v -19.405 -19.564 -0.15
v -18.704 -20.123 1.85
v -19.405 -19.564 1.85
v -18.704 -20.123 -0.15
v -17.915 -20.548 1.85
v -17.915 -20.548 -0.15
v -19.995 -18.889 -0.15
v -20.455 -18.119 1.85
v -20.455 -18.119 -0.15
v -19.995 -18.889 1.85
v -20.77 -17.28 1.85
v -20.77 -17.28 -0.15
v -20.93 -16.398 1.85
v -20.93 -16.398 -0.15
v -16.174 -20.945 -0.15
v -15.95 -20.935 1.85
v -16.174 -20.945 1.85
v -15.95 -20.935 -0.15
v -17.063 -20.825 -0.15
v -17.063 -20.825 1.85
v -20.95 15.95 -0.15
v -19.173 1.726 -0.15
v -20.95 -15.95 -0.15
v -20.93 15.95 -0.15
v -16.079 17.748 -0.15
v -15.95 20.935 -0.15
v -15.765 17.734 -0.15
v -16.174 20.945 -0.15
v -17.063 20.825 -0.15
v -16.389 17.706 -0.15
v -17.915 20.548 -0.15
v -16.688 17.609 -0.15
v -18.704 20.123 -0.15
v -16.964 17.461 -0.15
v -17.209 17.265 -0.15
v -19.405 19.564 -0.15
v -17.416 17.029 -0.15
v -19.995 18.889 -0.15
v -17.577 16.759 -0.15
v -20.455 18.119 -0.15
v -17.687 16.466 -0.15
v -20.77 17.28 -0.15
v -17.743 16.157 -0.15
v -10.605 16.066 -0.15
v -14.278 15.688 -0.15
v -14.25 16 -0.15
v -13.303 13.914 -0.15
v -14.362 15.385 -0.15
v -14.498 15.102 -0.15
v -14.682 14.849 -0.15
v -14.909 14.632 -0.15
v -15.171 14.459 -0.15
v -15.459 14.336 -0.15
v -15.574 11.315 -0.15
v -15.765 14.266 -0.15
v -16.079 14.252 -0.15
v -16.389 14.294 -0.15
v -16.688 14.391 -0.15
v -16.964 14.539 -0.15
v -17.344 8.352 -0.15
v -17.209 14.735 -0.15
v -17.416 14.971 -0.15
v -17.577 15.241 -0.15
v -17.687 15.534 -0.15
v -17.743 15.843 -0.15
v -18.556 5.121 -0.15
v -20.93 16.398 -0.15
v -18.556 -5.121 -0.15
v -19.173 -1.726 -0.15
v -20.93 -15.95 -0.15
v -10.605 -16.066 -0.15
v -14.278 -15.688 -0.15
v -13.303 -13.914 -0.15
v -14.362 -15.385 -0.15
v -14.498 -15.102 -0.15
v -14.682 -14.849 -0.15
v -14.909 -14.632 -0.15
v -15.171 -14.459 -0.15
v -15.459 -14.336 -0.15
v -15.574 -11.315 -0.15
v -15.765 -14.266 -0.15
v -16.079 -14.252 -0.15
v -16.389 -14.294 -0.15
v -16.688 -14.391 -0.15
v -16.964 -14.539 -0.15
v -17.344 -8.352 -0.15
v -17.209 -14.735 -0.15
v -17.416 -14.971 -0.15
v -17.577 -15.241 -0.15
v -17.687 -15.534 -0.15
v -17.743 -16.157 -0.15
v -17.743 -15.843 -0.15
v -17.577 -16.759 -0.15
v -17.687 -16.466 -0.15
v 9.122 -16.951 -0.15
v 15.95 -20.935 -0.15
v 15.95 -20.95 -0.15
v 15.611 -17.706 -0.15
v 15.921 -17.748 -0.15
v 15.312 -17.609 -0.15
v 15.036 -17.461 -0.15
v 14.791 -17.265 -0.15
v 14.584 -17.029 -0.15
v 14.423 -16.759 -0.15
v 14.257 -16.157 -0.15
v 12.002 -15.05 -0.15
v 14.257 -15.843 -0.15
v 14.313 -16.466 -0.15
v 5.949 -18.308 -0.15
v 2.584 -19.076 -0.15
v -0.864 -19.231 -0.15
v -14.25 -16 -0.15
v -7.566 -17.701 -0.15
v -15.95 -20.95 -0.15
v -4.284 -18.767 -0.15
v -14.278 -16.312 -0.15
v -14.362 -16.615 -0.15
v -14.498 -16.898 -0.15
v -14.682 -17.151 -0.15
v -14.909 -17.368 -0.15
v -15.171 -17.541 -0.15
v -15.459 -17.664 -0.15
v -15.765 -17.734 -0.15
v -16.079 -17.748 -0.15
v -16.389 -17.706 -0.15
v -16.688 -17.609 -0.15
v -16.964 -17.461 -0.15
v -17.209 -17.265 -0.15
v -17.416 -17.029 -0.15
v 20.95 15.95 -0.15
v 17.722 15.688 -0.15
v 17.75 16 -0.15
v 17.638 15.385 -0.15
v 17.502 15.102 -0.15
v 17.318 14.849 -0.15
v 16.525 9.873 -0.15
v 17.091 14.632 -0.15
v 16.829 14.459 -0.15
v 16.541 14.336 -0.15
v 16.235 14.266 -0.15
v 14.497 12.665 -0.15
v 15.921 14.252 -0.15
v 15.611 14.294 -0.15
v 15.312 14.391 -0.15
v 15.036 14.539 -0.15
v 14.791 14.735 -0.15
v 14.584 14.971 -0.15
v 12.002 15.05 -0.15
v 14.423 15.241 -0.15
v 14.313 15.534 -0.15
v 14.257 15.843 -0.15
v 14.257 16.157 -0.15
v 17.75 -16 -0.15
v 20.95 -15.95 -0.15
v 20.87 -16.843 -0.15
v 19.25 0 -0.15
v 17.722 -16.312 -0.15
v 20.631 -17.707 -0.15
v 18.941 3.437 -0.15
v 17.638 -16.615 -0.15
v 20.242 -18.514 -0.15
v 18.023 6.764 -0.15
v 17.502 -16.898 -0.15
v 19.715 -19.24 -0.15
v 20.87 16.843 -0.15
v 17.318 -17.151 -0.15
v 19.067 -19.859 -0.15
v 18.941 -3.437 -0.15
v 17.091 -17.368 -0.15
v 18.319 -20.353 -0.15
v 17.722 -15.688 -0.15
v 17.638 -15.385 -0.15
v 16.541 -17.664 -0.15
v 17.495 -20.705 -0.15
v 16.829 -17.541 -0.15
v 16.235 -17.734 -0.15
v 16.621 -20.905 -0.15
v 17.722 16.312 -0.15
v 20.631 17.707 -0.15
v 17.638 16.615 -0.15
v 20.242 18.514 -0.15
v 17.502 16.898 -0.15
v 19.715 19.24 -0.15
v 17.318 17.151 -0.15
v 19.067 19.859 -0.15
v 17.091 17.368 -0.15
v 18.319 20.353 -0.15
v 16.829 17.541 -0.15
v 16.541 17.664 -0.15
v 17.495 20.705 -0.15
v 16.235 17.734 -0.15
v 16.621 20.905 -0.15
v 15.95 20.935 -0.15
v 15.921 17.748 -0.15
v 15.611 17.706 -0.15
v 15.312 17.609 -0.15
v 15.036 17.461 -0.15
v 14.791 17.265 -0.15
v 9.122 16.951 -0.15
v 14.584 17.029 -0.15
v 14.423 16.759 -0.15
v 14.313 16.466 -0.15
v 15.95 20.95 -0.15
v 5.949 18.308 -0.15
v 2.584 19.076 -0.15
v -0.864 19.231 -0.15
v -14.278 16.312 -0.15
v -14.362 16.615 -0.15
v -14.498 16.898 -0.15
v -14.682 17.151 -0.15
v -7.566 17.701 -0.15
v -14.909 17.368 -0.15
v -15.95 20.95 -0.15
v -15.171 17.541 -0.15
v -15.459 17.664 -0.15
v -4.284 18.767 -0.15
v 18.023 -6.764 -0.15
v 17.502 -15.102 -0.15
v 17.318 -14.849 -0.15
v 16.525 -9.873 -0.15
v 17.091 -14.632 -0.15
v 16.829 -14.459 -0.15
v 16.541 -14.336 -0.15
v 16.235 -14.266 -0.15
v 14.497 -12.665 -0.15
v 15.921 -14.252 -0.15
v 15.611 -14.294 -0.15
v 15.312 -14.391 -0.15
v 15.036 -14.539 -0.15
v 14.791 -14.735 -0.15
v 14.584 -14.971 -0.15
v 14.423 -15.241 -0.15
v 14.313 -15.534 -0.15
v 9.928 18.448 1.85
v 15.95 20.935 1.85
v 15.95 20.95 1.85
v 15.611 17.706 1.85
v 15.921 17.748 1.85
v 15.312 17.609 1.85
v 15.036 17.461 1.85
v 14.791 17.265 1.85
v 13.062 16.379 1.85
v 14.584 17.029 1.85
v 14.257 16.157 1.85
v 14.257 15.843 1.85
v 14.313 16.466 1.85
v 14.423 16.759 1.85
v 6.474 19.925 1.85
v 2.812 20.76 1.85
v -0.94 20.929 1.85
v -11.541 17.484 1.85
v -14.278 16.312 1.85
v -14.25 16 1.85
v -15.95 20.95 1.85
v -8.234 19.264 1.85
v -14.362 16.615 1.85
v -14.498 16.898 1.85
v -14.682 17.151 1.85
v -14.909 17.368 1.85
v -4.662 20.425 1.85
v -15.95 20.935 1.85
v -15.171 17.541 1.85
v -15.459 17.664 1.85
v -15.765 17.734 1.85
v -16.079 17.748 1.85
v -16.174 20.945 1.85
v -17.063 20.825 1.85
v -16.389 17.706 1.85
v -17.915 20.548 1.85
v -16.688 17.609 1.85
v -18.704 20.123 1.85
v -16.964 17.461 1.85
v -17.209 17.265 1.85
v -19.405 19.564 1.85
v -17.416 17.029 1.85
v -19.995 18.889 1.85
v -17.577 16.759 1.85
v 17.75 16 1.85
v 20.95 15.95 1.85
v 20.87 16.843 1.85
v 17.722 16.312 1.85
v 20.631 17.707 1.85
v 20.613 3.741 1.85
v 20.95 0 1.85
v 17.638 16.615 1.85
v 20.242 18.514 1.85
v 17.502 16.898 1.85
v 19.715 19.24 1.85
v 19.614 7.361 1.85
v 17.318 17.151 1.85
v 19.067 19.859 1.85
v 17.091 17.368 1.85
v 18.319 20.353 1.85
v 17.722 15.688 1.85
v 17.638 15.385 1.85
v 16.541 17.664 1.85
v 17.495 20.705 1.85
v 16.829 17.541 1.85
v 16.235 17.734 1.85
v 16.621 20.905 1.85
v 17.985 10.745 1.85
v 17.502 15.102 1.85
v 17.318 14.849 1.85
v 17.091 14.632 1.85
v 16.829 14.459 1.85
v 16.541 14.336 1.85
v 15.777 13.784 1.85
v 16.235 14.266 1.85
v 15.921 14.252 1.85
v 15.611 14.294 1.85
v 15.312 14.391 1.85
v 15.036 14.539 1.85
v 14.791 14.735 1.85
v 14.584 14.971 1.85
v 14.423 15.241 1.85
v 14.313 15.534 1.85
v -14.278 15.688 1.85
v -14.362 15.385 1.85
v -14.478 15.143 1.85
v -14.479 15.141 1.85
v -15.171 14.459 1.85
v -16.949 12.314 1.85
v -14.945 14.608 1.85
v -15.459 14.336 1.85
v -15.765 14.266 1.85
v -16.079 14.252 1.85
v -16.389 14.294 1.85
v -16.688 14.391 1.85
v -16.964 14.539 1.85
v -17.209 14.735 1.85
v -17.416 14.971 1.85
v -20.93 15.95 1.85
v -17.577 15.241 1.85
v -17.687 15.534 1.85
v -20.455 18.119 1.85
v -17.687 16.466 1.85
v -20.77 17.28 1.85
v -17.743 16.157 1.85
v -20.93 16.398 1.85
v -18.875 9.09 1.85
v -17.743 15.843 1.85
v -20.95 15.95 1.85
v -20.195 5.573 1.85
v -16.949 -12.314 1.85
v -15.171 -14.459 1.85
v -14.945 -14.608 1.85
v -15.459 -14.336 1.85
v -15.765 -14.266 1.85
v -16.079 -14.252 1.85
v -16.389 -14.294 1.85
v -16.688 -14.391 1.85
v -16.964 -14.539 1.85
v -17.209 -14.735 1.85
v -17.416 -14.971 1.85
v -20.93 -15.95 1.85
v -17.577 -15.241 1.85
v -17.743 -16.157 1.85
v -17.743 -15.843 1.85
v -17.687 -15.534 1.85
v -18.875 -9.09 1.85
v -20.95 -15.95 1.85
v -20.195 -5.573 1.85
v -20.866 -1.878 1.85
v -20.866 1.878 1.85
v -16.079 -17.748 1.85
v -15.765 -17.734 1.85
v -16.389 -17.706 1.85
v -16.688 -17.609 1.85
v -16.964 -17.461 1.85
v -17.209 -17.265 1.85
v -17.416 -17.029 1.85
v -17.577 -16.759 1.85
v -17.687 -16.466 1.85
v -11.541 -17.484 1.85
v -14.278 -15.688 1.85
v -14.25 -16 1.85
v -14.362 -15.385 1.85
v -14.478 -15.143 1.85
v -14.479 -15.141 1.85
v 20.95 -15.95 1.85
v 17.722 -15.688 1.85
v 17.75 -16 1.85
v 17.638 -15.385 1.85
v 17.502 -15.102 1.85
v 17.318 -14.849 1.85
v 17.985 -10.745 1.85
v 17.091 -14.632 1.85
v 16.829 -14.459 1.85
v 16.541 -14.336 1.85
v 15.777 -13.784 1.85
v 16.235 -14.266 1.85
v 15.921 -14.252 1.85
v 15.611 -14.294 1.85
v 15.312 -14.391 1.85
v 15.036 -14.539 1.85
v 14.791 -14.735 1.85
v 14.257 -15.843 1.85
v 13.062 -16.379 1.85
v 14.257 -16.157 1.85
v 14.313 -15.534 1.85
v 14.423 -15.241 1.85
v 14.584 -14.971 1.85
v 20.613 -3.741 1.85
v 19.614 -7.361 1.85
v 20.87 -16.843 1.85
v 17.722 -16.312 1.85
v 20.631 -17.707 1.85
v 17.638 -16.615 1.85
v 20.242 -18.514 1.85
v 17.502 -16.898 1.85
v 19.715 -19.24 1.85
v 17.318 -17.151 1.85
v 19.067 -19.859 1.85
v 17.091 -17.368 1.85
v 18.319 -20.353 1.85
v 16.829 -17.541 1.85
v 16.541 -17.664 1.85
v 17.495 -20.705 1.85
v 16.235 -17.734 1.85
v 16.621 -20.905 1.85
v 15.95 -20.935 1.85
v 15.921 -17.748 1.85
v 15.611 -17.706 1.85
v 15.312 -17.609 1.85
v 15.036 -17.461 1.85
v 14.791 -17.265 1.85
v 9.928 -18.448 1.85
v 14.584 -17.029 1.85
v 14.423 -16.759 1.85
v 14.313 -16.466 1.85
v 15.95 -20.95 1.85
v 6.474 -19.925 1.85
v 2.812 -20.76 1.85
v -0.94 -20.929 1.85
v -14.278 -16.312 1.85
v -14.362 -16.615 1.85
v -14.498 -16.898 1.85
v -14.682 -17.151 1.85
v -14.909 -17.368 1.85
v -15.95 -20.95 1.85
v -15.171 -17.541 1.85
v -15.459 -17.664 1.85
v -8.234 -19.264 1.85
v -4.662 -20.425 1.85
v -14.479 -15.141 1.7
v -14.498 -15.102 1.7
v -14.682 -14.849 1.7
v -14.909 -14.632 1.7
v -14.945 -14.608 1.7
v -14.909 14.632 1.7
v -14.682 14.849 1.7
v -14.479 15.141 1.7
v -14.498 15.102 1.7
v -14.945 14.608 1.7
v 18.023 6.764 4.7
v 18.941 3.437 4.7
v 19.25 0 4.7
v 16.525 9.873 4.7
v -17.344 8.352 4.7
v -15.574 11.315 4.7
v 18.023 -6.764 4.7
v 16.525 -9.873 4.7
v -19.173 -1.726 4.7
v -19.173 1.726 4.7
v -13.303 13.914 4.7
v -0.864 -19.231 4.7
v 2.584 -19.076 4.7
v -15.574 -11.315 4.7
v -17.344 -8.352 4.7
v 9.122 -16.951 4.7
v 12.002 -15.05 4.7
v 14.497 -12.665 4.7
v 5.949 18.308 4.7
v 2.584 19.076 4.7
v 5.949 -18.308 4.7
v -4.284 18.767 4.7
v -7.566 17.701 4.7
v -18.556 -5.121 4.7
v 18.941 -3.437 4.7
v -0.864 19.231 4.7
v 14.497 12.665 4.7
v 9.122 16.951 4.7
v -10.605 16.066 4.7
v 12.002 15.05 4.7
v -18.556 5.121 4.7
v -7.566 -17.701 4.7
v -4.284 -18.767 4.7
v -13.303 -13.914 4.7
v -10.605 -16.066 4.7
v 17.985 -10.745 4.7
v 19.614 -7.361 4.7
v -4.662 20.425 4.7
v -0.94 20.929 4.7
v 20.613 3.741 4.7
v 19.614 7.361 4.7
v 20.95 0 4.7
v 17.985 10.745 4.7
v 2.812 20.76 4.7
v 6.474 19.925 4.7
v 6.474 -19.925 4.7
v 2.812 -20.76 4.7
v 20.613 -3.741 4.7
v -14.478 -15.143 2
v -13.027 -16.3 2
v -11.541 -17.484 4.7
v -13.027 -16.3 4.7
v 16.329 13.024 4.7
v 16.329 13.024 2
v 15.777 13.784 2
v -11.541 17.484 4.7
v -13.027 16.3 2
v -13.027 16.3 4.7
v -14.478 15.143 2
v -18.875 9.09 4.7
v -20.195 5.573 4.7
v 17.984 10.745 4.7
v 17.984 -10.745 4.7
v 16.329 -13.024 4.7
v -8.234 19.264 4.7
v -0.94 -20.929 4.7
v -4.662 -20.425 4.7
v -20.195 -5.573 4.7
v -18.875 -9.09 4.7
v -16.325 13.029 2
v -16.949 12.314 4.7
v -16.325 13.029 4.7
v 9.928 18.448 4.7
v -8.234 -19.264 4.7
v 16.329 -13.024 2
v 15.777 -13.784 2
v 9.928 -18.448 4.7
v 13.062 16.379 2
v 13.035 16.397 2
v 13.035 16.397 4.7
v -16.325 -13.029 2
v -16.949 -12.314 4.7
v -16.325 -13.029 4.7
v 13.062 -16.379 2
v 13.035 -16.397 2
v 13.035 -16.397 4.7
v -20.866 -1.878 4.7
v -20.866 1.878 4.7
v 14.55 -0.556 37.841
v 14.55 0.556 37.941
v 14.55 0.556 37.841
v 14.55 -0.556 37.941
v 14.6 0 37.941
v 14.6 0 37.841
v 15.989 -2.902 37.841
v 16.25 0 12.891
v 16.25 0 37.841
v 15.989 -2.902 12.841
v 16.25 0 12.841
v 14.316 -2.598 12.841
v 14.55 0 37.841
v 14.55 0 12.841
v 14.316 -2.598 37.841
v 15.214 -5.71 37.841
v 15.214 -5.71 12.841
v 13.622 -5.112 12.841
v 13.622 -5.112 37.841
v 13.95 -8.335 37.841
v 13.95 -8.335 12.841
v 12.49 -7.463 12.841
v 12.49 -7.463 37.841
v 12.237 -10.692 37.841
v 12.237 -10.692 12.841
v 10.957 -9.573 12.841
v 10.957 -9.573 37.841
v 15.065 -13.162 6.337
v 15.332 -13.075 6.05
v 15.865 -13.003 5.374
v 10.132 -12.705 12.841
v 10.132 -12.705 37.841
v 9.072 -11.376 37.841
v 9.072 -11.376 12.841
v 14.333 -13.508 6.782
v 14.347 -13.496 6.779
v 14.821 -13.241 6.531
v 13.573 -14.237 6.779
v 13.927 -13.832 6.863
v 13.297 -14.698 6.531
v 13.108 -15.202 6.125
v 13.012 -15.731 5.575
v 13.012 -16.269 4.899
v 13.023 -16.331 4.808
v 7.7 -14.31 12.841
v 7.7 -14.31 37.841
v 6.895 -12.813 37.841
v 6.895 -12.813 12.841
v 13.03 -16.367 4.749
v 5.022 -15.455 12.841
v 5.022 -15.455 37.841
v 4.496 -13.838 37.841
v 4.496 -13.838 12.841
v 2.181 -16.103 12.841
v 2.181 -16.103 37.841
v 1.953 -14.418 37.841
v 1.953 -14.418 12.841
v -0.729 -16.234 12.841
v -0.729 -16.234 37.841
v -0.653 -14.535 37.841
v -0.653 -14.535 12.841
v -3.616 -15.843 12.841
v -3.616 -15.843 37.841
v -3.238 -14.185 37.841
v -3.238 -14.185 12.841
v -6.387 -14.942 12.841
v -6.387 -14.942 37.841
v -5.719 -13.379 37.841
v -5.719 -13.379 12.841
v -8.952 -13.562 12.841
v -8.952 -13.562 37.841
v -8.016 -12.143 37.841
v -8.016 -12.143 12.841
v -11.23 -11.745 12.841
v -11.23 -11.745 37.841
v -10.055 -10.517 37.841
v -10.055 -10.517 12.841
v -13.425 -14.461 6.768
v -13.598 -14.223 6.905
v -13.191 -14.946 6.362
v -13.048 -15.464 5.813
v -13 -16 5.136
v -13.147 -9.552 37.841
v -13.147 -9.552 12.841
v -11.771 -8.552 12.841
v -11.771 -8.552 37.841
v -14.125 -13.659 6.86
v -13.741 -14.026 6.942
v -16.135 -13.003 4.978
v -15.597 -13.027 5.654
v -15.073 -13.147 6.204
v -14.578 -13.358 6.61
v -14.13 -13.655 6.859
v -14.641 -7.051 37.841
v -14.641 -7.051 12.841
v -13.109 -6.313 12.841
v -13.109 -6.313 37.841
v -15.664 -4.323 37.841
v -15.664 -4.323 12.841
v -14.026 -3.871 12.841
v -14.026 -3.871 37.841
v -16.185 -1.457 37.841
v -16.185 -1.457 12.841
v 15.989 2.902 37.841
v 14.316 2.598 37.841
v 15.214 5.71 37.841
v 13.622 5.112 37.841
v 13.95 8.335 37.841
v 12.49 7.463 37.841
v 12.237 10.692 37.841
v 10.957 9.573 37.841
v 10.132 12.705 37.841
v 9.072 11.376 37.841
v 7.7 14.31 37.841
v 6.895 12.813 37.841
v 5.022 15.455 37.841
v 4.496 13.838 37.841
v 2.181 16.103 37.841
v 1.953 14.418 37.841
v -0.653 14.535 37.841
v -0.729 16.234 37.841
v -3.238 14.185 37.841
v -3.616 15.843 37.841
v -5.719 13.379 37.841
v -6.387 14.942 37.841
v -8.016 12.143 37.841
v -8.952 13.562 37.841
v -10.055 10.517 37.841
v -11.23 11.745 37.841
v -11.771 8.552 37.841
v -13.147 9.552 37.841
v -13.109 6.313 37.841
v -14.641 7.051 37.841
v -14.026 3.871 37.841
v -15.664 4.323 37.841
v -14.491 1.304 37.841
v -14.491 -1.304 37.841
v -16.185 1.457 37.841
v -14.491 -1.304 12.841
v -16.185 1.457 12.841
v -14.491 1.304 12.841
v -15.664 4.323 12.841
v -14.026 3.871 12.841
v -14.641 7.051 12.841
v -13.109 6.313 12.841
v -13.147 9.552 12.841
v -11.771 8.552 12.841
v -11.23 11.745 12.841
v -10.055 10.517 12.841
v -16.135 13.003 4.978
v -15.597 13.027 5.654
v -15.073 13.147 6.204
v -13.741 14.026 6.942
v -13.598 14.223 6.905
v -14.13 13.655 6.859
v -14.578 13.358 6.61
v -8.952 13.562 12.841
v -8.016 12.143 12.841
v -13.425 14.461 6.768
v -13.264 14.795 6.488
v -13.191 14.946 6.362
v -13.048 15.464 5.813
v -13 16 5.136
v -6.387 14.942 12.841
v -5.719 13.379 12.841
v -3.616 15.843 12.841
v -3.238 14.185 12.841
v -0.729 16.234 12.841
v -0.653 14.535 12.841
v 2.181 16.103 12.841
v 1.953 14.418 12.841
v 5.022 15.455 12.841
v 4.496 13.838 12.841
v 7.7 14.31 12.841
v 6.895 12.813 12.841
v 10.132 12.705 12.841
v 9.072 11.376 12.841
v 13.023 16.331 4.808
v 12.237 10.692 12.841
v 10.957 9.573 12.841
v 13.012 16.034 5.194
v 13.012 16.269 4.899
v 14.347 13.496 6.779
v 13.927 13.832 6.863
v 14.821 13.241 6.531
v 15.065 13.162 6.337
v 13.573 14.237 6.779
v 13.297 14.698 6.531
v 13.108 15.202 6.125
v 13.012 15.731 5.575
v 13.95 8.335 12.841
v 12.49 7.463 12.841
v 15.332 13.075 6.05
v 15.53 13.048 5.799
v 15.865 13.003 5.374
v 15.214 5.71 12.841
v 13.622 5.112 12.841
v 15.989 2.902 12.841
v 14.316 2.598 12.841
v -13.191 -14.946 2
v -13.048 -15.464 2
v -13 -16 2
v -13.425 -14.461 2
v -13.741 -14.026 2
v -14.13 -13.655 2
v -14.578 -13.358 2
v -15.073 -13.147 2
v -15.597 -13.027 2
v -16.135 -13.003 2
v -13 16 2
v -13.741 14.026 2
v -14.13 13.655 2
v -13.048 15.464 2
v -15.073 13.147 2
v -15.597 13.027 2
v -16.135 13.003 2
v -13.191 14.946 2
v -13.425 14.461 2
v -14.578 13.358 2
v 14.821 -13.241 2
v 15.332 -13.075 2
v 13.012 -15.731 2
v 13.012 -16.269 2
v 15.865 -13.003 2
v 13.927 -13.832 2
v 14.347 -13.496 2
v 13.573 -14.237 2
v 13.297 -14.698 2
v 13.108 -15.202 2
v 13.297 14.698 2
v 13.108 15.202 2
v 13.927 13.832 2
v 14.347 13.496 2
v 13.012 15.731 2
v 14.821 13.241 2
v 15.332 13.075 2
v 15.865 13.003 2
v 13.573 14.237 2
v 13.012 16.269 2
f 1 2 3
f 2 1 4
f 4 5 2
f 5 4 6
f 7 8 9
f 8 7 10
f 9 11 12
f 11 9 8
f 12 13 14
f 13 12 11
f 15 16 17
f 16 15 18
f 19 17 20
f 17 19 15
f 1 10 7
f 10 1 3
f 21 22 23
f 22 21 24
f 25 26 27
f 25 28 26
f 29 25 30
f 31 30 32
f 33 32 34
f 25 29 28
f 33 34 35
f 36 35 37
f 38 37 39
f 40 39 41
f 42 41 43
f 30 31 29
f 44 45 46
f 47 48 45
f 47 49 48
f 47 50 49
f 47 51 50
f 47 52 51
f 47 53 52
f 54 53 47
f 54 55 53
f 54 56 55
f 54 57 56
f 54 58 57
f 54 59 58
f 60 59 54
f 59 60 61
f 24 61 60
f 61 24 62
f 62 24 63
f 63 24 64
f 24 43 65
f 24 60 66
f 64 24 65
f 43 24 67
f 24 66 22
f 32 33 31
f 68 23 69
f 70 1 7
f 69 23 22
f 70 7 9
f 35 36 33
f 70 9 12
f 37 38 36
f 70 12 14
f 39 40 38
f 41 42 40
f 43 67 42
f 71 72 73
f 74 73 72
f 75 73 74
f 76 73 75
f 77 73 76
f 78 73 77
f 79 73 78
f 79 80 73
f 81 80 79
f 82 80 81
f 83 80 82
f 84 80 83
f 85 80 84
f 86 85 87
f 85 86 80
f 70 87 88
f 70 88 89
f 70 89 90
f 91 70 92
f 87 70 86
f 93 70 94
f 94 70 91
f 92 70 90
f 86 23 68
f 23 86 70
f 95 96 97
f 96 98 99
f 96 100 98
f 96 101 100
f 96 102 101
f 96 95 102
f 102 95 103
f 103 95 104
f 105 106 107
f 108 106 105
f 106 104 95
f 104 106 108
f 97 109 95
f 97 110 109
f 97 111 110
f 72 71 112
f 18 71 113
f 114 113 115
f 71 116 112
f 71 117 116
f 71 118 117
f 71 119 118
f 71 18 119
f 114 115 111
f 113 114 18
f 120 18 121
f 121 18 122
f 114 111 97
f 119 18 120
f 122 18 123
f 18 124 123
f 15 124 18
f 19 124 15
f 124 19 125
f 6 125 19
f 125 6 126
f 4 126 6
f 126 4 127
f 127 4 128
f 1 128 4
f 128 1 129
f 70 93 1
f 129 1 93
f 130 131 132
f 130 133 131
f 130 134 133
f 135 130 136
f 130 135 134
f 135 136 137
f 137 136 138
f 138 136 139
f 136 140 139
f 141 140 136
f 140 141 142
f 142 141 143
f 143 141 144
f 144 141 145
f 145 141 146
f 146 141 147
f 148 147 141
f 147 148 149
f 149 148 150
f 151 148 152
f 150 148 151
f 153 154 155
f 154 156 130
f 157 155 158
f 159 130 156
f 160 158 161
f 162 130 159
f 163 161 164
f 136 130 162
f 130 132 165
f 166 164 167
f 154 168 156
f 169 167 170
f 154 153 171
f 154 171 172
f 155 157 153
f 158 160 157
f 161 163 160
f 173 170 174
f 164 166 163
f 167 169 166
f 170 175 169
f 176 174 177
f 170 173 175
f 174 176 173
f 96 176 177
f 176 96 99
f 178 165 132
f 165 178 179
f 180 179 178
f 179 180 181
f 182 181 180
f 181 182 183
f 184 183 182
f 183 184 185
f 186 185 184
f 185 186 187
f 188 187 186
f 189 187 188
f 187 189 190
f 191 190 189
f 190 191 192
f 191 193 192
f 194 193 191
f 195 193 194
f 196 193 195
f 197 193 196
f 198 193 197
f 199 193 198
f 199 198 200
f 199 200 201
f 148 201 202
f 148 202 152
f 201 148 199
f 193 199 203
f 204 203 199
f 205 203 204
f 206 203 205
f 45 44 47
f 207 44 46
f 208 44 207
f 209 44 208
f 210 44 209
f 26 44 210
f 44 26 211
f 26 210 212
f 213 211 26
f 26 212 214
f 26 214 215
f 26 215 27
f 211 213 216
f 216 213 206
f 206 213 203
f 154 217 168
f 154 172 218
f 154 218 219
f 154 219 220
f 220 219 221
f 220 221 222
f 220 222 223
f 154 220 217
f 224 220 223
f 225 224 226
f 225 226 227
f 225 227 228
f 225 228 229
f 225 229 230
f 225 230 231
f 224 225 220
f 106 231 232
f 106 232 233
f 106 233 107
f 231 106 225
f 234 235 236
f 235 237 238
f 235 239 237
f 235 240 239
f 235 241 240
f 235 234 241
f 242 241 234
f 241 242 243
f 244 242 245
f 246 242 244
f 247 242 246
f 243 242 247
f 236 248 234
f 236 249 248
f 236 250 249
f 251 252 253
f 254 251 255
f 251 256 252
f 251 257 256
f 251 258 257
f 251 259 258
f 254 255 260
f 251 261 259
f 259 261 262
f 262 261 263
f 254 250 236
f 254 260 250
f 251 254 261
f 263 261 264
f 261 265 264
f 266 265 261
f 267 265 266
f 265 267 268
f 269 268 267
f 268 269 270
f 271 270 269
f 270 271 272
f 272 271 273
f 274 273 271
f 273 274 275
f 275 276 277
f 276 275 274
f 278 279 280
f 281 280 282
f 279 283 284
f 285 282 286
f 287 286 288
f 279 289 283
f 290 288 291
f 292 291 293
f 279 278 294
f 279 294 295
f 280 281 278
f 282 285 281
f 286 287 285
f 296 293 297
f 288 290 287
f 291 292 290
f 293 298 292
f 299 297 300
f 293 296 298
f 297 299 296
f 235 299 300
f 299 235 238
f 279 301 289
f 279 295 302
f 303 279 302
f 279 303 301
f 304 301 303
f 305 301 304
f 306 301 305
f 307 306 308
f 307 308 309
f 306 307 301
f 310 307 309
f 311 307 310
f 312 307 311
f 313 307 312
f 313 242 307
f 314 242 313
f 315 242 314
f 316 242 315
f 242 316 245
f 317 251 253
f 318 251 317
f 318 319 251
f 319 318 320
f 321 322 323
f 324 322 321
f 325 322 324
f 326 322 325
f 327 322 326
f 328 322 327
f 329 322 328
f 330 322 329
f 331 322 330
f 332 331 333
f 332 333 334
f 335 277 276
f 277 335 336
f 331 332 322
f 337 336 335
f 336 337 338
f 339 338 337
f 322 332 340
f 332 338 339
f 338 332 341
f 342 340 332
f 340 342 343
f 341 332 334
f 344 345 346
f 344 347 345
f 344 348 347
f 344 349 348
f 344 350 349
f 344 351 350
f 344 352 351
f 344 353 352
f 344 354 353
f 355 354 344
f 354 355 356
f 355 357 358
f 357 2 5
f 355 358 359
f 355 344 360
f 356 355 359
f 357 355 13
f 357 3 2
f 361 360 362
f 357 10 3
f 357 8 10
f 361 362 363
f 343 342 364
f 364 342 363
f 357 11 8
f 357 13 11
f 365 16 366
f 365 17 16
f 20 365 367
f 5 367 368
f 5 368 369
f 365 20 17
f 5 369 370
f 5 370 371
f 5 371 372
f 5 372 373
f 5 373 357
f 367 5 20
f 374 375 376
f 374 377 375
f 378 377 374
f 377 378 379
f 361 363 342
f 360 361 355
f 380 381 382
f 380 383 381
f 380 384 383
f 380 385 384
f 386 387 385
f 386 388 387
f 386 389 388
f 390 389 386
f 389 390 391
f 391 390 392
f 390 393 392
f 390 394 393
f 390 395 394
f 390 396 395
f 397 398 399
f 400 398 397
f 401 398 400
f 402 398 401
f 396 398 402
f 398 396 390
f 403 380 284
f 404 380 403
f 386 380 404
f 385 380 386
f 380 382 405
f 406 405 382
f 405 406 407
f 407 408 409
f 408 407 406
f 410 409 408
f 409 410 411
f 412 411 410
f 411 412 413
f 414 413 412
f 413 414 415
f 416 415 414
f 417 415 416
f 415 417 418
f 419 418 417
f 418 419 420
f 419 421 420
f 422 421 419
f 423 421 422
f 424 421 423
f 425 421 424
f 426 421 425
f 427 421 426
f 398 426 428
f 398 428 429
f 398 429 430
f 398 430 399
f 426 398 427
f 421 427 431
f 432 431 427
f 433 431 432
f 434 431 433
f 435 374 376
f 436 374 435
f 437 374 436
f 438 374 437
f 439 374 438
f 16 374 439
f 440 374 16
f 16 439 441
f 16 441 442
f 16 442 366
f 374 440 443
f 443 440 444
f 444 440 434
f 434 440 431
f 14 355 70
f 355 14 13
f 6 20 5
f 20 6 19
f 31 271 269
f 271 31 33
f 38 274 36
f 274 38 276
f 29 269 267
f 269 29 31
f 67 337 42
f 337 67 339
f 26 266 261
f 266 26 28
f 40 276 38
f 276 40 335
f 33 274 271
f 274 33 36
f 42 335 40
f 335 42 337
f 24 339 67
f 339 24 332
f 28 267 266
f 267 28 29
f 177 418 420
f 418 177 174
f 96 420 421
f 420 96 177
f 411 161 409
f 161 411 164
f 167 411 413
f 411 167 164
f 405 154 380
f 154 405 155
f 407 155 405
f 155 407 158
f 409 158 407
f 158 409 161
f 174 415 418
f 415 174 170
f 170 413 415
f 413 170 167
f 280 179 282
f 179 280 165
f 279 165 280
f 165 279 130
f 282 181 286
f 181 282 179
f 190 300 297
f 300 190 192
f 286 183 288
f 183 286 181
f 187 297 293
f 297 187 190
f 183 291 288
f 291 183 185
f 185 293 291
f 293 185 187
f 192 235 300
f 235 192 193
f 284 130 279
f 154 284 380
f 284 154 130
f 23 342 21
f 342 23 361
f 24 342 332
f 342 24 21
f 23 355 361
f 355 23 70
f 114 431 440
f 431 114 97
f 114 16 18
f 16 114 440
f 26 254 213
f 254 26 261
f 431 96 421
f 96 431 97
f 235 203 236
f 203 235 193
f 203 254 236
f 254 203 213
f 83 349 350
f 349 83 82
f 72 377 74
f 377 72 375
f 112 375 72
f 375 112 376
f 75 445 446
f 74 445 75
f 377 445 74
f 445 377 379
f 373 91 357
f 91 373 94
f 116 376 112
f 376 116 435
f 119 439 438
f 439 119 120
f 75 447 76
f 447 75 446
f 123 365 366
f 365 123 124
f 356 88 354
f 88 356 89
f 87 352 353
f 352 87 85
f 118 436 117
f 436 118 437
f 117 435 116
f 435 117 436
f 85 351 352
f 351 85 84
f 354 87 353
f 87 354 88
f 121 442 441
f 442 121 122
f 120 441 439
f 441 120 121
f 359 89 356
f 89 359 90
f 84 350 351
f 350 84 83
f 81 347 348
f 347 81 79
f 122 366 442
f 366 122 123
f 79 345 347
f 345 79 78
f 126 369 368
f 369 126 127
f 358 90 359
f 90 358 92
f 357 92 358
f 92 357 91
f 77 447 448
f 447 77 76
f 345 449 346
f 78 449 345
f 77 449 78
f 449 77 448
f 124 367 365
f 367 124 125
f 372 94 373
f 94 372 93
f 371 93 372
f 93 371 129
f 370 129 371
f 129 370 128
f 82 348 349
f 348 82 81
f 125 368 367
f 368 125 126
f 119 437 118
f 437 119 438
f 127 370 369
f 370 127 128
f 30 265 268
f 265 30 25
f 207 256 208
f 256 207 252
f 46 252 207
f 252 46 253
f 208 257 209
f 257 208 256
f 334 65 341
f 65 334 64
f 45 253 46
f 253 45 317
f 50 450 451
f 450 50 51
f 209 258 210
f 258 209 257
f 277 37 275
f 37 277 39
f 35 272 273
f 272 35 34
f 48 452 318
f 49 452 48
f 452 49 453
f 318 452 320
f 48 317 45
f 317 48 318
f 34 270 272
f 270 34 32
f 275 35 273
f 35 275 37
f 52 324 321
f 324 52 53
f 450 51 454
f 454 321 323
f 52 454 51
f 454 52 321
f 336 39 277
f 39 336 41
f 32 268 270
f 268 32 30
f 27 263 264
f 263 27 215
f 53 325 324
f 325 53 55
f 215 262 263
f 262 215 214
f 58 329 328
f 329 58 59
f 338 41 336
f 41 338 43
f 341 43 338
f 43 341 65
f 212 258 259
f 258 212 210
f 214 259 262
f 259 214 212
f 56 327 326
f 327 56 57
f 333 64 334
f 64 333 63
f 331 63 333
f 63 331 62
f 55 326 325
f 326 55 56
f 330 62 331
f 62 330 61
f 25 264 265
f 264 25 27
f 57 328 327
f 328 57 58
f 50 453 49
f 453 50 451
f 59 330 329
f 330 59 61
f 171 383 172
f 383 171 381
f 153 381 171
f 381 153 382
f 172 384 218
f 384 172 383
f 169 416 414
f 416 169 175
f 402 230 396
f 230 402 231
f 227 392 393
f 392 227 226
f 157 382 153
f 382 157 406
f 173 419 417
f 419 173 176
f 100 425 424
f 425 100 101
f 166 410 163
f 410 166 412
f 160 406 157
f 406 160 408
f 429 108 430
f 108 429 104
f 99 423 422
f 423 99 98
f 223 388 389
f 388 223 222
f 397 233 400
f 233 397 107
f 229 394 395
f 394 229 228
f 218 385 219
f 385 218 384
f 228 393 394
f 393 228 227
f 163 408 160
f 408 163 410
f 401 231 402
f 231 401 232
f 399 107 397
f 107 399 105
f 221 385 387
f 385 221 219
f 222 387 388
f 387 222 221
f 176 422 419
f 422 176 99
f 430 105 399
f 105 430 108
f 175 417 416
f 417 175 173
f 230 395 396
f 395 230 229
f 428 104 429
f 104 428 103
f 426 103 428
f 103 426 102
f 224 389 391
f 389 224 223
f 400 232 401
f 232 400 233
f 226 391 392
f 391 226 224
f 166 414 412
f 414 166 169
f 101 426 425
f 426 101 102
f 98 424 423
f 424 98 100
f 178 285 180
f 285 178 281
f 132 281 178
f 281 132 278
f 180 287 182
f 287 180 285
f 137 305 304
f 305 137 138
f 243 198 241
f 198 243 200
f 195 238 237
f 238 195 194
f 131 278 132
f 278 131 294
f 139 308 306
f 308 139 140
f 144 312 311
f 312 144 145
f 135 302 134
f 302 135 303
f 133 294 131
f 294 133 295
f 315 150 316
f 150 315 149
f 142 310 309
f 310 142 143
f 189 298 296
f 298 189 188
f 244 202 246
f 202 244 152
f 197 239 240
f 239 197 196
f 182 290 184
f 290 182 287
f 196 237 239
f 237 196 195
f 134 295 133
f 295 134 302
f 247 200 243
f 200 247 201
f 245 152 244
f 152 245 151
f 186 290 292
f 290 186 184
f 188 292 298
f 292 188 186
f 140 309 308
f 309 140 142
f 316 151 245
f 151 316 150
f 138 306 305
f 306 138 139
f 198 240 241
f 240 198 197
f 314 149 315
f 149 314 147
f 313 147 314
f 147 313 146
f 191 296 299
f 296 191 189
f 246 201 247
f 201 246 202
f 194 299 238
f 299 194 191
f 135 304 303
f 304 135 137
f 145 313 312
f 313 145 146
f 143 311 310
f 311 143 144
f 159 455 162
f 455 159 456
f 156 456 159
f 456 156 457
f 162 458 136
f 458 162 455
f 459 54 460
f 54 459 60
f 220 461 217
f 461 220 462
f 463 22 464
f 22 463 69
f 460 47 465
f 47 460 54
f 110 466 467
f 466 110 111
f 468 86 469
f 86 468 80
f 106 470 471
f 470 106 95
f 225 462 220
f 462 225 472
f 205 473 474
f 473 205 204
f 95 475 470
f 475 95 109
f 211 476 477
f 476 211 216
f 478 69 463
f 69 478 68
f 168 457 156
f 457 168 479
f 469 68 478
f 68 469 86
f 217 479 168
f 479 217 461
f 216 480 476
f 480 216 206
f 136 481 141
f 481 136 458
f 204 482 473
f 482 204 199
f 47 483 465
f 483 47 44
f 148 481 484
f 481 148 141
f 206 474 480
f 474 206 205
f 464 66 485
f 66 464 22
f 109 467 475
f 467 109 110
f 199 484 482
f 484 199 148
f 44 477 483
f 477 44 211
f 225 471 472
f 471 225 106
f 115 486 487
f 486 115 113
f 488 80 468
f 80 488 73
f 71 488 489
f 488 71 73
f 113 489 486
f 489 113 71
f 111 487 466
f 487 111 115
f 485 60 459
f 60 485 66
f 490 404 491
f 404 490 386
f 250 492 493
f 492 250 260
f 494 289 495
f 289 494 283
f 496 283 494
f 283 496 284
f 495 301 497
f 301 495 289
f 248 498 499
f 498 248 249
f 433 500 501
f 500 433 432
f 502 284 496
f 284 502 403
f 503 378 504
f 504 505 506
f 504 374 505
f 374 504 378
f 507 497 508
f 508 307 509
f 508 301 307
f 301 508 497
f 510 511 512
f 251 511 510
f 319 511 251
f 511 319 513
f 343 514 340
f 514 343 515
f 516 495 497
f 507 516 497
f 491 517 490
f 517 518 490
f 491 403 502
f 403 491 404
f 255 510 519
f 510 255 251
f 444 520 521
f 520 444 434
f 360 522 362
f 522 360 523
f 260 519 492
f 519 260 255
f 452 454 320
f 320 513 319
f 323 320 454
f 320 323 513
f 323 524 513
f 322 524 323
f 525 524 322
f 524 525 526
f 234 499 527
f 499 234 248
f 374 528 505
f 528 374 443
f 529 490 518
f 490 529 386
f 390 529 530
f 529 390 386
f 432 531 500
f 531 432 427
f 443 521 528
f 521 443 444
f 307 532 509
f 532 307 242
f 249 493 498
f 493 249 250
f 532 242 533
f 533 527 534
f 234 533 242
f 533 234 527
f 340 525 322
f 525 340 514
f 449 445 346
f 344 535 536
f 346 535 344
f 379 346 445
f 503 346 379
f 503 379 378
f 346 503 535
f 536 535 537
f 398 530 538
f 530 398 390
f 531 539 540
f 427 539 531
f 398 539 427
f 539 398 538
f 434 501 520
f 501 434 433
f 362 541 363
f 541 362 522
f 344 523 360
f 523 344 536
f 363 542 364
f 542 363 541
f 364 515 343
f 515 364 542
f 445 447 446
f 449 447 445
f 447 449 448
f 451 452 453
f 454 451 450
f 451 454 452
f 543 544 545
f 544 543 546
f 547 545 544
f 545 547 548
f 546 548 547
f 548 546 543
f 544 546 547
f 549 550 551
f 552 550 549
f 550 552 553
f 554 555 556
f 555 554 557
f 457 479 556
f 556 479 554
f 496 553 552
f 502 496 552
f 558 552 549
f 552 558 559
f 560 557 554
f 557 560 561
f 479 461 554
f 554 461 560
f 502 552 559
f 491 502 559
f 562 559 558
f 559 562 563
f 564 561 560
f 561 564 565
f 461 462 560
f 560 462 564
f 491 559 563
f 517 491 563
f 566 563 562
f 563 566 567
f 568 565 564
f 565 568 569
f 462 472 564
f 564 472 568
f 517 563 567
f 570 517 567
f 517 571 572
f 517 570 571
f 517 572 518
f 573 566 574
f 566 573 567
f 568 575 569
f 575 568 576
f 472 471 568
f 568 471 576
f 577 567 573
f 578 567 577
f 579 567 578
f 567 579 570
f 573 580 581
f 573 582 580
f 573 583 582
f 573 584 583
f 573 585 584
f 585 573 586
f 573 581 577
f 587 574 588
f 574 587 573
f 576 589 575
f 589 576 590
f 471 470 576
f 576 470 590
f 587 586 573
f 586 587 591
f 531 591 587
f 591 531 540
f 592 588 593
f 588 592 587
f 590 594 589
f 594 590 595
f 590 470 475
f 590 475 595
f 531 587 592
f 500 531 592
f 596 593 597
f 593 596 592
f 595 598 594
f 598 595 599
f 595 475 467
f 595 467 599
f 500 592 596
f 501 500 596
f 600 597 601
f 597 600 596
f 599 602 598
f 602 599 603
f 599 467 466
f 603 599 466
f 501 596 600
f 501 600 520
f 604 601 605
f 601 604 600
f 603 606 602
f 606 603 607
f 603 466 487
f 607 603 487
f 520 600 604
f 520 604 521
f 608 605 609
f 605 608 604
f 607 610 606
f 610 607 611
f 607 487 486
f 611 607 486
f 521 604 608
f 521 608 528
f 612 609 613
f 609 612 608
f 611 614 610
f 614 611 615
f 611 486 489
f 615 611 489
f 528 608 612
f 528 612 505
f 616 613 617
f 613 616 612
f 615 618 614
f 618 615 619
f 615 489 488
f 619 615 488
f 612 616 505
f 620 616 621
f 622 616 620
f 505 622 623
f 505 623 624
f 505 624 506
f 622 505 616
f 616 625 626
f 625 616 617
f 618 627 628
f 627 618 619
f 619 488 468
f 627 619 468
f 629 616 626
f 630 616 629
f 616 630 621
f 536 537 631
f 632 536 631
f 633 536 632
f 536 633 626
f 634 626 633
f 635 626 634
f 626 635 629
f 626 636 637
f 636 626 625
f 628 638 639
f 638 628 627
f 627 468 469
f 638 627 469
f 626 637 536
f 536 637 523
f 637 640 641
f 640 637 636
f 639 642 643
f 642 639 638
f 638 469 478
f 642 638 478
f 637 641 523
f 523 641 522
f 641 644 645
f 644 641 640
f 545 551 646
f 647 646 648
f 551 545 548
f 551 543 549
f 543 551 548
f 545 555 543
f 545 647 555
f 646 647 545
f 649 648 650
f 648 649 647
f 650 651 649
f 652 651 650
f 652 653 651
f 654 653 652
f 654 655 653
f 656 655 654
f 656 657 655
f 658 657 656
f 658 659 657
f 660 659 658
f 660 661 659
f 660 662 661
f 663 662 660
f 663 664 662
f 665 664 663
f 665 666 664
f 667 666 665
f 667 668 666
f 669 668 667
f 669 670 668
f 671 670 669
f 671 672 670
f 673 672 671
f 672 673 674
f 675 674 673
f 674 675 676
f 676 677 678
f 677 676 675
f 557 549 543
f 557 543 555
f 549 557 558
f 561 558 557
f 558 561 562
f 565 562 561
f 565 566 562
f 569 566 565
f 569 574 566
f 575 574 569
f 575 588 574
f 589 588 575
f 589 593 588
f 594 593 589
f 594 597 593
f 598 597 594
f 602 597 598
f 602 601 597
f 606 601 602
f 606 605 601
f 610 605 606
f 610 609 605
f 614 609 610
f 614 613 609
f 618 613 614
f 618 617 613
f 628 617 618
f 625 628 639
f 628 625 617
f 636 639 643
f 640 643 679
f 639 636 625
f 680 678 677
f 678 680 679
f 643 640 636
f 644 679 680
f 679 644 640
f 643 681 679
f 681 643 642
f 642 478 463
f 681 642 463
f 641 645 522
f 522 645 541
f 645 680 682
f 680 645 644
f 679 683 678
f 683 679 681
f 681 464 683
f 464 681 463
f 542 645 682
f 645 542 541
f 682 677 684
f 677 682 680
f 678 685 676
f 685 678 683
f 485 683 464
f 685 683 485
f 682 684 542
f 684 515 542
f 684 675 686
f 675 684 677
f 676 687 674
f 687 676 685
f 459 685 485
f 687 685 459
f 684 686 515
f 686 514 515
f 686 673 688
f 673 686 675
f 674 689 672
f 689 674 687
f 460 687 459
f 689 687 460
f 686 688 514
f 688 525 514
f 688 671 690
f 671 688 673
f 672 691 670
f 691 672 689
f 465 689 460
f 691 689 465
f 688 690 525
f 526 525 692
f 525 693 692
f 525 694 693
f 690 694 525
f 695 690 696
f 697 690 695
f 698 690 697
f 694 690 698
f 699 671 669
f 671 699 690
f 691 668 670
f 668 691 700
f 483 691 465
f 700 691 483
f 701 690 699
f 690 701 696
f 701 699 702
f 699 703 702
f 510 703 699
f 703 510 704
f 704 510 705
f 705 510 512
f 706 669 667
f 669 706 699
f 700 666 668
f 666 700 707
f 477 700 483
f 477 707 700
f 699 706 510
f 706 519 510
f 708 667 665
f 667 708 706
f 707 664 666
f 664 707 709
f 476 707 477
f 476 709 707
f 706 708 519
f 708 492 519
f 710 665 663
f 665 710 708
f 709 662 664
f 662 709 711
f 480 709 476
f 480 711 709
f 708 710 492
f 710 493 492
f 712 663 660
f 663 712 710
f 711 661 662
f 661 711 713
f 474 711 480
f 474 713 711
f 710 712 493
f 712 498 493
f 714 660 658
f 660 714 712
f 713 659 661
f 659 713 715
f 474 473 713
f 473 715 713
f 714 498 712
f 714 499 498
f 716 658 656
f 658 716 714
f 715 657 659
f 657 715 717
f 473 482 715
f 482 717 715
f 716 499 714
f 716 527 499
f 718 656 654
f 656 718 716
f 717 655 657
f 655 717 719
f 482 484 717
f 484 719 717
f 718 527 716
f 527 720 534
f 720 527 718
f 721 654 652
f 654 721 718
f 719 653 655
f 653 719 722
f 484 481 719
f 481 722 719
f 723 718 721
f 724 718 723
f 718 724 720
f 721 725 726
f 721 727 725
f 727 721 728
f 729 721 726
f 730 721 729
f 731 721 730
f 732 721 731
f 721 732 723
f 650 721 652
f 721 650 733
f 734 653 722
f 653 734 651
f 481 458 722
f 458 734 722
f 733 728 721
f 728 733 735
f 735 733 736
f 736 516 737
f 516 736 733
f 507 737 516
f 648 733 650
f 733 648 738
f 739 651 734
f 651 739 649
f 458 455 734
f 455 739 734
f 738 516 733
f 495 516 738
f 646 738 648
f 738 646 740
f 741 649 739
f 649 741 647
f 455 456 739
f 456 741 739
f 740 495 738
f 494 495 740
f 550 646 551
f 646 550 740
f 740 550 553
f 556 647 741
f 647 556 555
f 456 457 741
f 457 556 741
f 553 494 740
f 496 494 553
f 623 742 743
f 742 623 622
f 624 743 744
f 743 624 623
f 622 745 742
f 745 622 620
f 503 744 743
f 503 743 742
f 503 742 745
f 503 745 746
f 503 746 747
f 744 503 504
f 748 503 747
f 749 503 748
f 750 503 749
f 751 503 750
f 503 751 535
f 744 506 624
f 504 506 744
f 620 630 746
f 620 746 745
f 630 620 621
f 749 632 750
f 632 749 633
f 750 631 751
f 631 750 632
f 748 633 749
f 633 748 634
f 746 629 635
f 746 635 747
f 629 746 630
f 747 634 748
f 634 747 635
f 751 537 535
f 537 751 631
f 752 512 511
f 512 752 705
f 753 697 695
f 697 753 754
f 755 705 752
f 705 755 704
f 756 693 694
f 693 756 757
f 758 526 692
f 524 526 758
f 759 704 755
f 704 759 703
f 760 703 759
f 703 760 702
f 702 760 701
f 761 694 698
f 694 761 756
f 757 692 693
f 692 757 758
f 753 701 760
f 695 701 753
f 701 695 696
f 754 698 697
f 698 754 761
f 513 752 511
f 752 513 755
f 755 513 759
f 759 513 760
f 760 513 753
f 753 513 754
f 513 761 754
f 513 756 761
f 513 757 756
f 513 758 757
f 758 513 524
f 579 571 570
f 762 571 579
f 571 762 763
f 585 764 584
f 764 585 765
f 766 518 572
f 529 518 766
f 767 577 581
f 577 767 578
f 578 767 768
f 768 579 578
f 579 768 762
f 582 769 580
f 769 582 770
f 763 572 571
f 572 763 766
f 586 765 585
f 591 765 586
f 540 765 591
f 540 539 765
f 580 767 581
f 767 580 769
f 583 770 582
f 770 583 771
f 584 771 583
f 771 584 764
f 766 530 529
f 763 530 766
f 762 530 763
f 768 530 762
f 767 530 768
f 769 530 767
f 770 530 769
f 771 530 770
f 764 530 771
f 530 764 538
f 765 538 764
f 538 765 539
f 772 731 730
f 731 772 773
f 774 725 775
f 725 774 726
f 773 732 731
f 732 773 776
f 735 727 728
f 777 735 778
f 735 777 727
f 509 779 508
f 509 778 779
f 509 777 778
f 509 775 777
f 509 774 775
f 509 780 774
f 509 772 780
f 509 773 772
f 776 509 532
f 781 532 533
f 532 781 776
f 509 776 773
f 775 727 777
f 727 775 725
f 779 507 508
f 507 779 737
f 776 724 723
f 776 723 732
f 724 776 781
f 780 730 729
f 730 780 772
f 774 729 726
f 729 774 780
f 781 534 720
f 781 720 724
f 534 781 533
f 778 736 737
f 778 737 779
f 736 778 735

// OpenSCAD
/*
 * Tube Adapter Flange with Grating (Parametric), v1.00
 *
 * by Alex Franke (CodeCreations), Dec 2012
 * http://www.theFrankes.com
 * 
 * Licenced under Creative Commons Attribution - Non-Commercial - Share Alike 3.0 
 * 
 * DESCRIPTION: This allows you to cover a hole with a specific diameter (with optional 
 *   grating) and then attach a hose of a different diameter. For example, if you're creating
 *   an exhaust vent for a 40mm fan to push air out through a 1.25-inch tube, then you can 
 *   render this file with a 40mm input diameter and a 1.25-inch output diameter. The angle
 *   of the transition is configurable to ensure good prints. 
 * 
 * INSTRUCTIONS:  Choose some values in the "User-defined values" section, render,
 *   and print. See the comments in that section for details on how to measure. 
 * 
 * v1.00, Mar 1, 2014: Added pinch angles, flange thickness, end rounding.
 * v0.42, Dec 20, 2012: Initial Release.
 * 
 * TODO: 
 *   * None at this time
 */

/////////////////////////////////////////////////////////////////////////////
// User-defined values... 
/////////////////////////////////////////////////////////////////////////////

roundRadius       = 5;    // The radius of the rounding on the corners
thickness         = 1.7;  // The thickness of the material (tube) 
flangeThickness   = 2.0;  // The thickness of the flange
holeDistance      = 32;   // The distance on center between the mounting holes on each side  
holeDiameter      = 3.5;  // The diameter of the mounting holes 

boltHeadDiameter  = 6;    // The diameter of the bolt head (so it doesn't interfere with the tube) 

angle             = 60;   // The angle of the transition between diameters

inputTubeLength   = 3;    // The length the input diameter will extend straight before the transition.  
inputDiameter     = 38.5; // The inner diameter (ID) of the input hole
outputLength      = 25;   // The length of the output diameter after the transition. 
outputDiameter    = 29.1; // The inner diameter (ID) of the output flange. 

meshLines         = 0;    // The number of mesh lines (grates) to render (zero for none) 
meshWidth         = 0;    // The width of the mesh material (grates) 
meshHeight        = 0;    // The thickness of the mesh material (grates)

optimizeThickness = true; // true to optimize transition thickness for FDM printing (a bit thinner), 
                          //   or false for consistent thickness 

pinchAngle1       = 90;   // The angle to pinch the output tube from one side
pinchAngle2       = 90;   // ...and from the other side 
tipCutRadius      = 0;    // The radius to round in the tip
tipCutInset       = 0;    // The distance to cut into the tip 

$fn               = 35;   // general curve quality

silliness         = 0.05; // Allows OpenSCAD to create good models 


/////////////////////////////////////////////////////////////////////////////
// Some calculated values and helpful output... 
/////////////////////////////////////////////////////////////////////////////

dx = (inputDiameter - outputDiameter)/2; 
height = dx*tan(angle);
yOffset = (thickness*tan(angle/2));
xOffset = yOffset*tan(angle);
totalHeight = inputTubeLength + outputLength + height; 

echo( str( "Outer diameter of output flange is ", outputDiameter+thickness*2, " mm or ",
	(outputDiameter+thickness*2)/25.4, " in.") ); 
echo( str( "Inner diameter of output flange is ", outputDiameter, " mm or ",
	outputDiameter/25.4, " in.") ); 
echo( str( "Total height is ", totalHeight, " mm or ",
	totalHeight/25.4, " in.") ); 


/////////////////////////////////////////////////////////////////////////////
// The code...
/////////////////////////////////////////////////////////////////////////////

difference() {
	union() {
		translate([0,0,thickness/2]) 
			base(); 
		translate([0,0,inputTubeLength/2+thickness]) 
			lowerTube(); 
		translate([0,0,thickness+inputTubeLength]) 
			cone(); 
	}

	// Carve some space for the mounting bolts. 
	translate([0,0,totalHeight/2+flangeThickness+0.5]) 
	for(x=[-1,1], y=[-1,1]) {
		translate([holeDistance/2*x,holeDistance/2*y,0]) 
			cylinder(h=totalHeight+1,r=boltHeadDiameter/2, center=true);
	}
}


/////////////////////////////////////////////////////////////////////////////
// The modules...
/////////////////////////////////////////////////////////////////////////////

// Comment out the "module" line and the "}" at the end to use these settings. 
// This is likely suitable for connecting a 40mm fan to a 1.25" tube.
module example1() {
	roundRadius       = 5;
	thickness         = 1.7;
	holeDistance      = 32;
	holeDiameter      = 3.5;
	
	boltHeadDiameter  = 6;
	
	angle             = 60;
	
	inputTubeLength   = 3;
	inputDiameter     = 38.5;
	outputLength      = 15;
	outputDiameter    = (1.28*25.4)-thickness*2;
	
	meshLines         = 0;
	meshWidth         = 0;
	meshHeight        = 0;
	
	optimizeThickness = true;
}

// Comment out the "module" line and the "}" at the end to use these settings. 
// This is likely suitable for connecting a 1.25" tube to cover a 1 1/8" - 1 1/4" hole.
module example2() {
	roundRadius       = 3;
	thickness         = 1.7;
	holeDistance      = 27;
	holeDiameter      = 3.5;
	
	boltHeadDiameter  = 6;
	
	angle             = 60;
	
	inputTubeLength   = 3;
	inputDiameter     = 30;
	outputLength      = 15;
	outputDiameter    = (1.28*25.4)-thickness*2;
	
	meshLines         = 7;
	meshWidth         = 0.8;
	meshHeight        = 1;
	
	optimizeThickness = true;
}

// Comment out the "module" line and the "}" at the end to use these settings. 
// This is likely suitable for connecting a 80mm fan to a 1 1/4" tube.
module example3() {
	roundRadius       = 3;
	thickness         = 1.7;
	holeDistance      = 71.6;
	holeDiameter      = 3.5;
	
	boltHeadDiameter  = 6;
	
	angle             = 60;
	
	inputTubeLength   = 3;
	inputDiameter     = 76;
	outputLength      = 15;
	outputDiameter    = (1.28*25.4)-thickness*2;
	
	meshLines         = 0;
	meshWidth         = 0;
	meshHeight        = 0;
	
	optimizeThickness = true;
}

// Comment out the "module" line and the "}" at the end to use these settings. 
// This makes a nice 40mm fan shroud.
module example4() {
	roundRadius       = 3;
	thickness         = 0.5;
 	flangeThickness   = 1; 
	holeDistance      = 32;
	holeDiameter      = 3.5;
	
	boltHeadDiameter  = 6;
	
	angle             = 68;
	
	inputTubeLength   = 1;
	inputDiameter     = 37;
	outputLength      = 12;
	outputDiameter    = 14;
	
	meshLines         = 0;
	meshWidth         = 0;
	meshHeight        = 0;
	
	optimizeThickness = true;

	pinchAngle1       = 60; 
	pinchAngle2       = 70;
	tipCutRadius      = 12; 
	tipCutInset       = 1.5; 
}


module cone() {
	
	y = optimizeThickness ? 0 : yOffset; 

	difference() { 

		union() {
			rotate([0,0,180]) // line up the edges 
			rotate_extrude(convexity=5)
			polygon(points=[
				[inputDiameter/2+thickness,0],
				[outputDiameter/2+thickness,height],
				[outputDiameter/2+thickness,height+outputLength],
				[outputDiameter/2,height+outputLength],
				[outputDiameter/2,height-y],
				[inputDiameter/2,0-y]
			]);
		
			translate([0,0,silliness]) 
			intersection() {
				union() {
					translate([outputDiameter/2,-(outputDiameter+1)/2,height]) 
						rotate([0,-90+pinchAngle1,0]) 
							cube([thickness,outputDiameter+1,outputLength*2]); 
					translate([-outputDiameter/2-thickness,-(outputDiameter+1)/2,height]) 
						rotate([0,90-pinchAngle2,0]) 
							cube([thickness,outputDiameter+1,outputLength*2]); 
				}
				translate([0,0,height+silliness]) 
					cylinder(h=outputLength, r=outputDiameter/2+silliness); 
			}
		}

		// clean up the pinches 
		translate([outputDiameter/2+thickness,-(outputDiameter+thickness*2+1)/2,height+silliness]) 
			rotate([0,-90+pinchAngle1,0]) 
				cube([outputDiameter,outputDiameter+thickness*2+1,outputLength*2]); 
		translate([-outputDiameter/2-thickness,-(outputDiameter+thickness*2+1)/2,height+silliness]) 
			rotate([0,90-pinchAngle2,0]) 
				translate([-outputDiameter,0,0]) 
				cube([outputDiameter,outputDiameter+thickness*2+1,outputLength*2]);

		// Cut a radius into the tip
		translate([0,0,height+outputLength+tipCutRadius-tipCutInset]) 
			rotate([0,90,0])  	
				cylinder(r=tipCutRadius, h=outputDiameter+thickness*2+1, center=true); 	

	}
}

module lowerTube() {
	difference() {
		cylinder(h=inputTubeLength, r=inputDiameter/2+thickness, center=true);
		cylinder(h=inputTubeLength+1, r=inputDiameter/2, center=true);
	}
}

module base() {
	wid = max( inputDiameter + thickness*2, holeDistance + boltHeadDiameter); 
	dist = wid/2-roundRadius; 
	// meshLines = ( inputDiameter + thickness*2 - meshSize ) / ( meshWidth + meshSize );
	meshDistance = ( wid-meshWidth*meshLines ) / (meshLines+1); 


	echo( str( "Mesh hole size ", meshWidth + meshDistance, " mm" ) ); 

	union() {

		difference() {
			union() {
				for(x=[-1,1], y=[-1,1]) {
					translate([dist*x,dist*y,0]) 
						cylinder(h=flangeThickness, r=roundRadius, center=true); 
				}
				for(r=[0,90]) {
					rotate([0,0,r]) 
						cube([wid,wid-roundRadius*2,flangeThickness], 
							center=true);
				}
			}
	
			// Mounting holes 
			for(x=[-1,1], y=[-1,1]) {
				translate([holeDistance/2*x,holeDistance/2*y,0]) 
					cylinder(h=flangeThickness+1,r=holeDiameter/2, center=true);
			}
	
			// Input hole 
			cylinder(h=thickness+1,r=inputDiameter/2, center=true);
		}

		// mesh
		if ( meshLines > 0 ) {
			intersection() {
				cylinder(h=thickness+1,r=inputDiameter/2, center=true);

				translate([-wid/2,-wid/2,-thickness/2]) {
					for(x=[0:meshLines-1]) 
						translate([meshDistance+x*(meshWidth + meshDistance),0,0]) {
							cube([meshWidth,wid,meshHeight]); 
						}
		
					for(y=[0:meshLines-1]) 
						translate([0,meshDistance+y*(meshWidth + meshDistance),0]) {
							cube([wid,meshWidth,meshHeight]); 
						}
				}
			}
		}
	}
}
